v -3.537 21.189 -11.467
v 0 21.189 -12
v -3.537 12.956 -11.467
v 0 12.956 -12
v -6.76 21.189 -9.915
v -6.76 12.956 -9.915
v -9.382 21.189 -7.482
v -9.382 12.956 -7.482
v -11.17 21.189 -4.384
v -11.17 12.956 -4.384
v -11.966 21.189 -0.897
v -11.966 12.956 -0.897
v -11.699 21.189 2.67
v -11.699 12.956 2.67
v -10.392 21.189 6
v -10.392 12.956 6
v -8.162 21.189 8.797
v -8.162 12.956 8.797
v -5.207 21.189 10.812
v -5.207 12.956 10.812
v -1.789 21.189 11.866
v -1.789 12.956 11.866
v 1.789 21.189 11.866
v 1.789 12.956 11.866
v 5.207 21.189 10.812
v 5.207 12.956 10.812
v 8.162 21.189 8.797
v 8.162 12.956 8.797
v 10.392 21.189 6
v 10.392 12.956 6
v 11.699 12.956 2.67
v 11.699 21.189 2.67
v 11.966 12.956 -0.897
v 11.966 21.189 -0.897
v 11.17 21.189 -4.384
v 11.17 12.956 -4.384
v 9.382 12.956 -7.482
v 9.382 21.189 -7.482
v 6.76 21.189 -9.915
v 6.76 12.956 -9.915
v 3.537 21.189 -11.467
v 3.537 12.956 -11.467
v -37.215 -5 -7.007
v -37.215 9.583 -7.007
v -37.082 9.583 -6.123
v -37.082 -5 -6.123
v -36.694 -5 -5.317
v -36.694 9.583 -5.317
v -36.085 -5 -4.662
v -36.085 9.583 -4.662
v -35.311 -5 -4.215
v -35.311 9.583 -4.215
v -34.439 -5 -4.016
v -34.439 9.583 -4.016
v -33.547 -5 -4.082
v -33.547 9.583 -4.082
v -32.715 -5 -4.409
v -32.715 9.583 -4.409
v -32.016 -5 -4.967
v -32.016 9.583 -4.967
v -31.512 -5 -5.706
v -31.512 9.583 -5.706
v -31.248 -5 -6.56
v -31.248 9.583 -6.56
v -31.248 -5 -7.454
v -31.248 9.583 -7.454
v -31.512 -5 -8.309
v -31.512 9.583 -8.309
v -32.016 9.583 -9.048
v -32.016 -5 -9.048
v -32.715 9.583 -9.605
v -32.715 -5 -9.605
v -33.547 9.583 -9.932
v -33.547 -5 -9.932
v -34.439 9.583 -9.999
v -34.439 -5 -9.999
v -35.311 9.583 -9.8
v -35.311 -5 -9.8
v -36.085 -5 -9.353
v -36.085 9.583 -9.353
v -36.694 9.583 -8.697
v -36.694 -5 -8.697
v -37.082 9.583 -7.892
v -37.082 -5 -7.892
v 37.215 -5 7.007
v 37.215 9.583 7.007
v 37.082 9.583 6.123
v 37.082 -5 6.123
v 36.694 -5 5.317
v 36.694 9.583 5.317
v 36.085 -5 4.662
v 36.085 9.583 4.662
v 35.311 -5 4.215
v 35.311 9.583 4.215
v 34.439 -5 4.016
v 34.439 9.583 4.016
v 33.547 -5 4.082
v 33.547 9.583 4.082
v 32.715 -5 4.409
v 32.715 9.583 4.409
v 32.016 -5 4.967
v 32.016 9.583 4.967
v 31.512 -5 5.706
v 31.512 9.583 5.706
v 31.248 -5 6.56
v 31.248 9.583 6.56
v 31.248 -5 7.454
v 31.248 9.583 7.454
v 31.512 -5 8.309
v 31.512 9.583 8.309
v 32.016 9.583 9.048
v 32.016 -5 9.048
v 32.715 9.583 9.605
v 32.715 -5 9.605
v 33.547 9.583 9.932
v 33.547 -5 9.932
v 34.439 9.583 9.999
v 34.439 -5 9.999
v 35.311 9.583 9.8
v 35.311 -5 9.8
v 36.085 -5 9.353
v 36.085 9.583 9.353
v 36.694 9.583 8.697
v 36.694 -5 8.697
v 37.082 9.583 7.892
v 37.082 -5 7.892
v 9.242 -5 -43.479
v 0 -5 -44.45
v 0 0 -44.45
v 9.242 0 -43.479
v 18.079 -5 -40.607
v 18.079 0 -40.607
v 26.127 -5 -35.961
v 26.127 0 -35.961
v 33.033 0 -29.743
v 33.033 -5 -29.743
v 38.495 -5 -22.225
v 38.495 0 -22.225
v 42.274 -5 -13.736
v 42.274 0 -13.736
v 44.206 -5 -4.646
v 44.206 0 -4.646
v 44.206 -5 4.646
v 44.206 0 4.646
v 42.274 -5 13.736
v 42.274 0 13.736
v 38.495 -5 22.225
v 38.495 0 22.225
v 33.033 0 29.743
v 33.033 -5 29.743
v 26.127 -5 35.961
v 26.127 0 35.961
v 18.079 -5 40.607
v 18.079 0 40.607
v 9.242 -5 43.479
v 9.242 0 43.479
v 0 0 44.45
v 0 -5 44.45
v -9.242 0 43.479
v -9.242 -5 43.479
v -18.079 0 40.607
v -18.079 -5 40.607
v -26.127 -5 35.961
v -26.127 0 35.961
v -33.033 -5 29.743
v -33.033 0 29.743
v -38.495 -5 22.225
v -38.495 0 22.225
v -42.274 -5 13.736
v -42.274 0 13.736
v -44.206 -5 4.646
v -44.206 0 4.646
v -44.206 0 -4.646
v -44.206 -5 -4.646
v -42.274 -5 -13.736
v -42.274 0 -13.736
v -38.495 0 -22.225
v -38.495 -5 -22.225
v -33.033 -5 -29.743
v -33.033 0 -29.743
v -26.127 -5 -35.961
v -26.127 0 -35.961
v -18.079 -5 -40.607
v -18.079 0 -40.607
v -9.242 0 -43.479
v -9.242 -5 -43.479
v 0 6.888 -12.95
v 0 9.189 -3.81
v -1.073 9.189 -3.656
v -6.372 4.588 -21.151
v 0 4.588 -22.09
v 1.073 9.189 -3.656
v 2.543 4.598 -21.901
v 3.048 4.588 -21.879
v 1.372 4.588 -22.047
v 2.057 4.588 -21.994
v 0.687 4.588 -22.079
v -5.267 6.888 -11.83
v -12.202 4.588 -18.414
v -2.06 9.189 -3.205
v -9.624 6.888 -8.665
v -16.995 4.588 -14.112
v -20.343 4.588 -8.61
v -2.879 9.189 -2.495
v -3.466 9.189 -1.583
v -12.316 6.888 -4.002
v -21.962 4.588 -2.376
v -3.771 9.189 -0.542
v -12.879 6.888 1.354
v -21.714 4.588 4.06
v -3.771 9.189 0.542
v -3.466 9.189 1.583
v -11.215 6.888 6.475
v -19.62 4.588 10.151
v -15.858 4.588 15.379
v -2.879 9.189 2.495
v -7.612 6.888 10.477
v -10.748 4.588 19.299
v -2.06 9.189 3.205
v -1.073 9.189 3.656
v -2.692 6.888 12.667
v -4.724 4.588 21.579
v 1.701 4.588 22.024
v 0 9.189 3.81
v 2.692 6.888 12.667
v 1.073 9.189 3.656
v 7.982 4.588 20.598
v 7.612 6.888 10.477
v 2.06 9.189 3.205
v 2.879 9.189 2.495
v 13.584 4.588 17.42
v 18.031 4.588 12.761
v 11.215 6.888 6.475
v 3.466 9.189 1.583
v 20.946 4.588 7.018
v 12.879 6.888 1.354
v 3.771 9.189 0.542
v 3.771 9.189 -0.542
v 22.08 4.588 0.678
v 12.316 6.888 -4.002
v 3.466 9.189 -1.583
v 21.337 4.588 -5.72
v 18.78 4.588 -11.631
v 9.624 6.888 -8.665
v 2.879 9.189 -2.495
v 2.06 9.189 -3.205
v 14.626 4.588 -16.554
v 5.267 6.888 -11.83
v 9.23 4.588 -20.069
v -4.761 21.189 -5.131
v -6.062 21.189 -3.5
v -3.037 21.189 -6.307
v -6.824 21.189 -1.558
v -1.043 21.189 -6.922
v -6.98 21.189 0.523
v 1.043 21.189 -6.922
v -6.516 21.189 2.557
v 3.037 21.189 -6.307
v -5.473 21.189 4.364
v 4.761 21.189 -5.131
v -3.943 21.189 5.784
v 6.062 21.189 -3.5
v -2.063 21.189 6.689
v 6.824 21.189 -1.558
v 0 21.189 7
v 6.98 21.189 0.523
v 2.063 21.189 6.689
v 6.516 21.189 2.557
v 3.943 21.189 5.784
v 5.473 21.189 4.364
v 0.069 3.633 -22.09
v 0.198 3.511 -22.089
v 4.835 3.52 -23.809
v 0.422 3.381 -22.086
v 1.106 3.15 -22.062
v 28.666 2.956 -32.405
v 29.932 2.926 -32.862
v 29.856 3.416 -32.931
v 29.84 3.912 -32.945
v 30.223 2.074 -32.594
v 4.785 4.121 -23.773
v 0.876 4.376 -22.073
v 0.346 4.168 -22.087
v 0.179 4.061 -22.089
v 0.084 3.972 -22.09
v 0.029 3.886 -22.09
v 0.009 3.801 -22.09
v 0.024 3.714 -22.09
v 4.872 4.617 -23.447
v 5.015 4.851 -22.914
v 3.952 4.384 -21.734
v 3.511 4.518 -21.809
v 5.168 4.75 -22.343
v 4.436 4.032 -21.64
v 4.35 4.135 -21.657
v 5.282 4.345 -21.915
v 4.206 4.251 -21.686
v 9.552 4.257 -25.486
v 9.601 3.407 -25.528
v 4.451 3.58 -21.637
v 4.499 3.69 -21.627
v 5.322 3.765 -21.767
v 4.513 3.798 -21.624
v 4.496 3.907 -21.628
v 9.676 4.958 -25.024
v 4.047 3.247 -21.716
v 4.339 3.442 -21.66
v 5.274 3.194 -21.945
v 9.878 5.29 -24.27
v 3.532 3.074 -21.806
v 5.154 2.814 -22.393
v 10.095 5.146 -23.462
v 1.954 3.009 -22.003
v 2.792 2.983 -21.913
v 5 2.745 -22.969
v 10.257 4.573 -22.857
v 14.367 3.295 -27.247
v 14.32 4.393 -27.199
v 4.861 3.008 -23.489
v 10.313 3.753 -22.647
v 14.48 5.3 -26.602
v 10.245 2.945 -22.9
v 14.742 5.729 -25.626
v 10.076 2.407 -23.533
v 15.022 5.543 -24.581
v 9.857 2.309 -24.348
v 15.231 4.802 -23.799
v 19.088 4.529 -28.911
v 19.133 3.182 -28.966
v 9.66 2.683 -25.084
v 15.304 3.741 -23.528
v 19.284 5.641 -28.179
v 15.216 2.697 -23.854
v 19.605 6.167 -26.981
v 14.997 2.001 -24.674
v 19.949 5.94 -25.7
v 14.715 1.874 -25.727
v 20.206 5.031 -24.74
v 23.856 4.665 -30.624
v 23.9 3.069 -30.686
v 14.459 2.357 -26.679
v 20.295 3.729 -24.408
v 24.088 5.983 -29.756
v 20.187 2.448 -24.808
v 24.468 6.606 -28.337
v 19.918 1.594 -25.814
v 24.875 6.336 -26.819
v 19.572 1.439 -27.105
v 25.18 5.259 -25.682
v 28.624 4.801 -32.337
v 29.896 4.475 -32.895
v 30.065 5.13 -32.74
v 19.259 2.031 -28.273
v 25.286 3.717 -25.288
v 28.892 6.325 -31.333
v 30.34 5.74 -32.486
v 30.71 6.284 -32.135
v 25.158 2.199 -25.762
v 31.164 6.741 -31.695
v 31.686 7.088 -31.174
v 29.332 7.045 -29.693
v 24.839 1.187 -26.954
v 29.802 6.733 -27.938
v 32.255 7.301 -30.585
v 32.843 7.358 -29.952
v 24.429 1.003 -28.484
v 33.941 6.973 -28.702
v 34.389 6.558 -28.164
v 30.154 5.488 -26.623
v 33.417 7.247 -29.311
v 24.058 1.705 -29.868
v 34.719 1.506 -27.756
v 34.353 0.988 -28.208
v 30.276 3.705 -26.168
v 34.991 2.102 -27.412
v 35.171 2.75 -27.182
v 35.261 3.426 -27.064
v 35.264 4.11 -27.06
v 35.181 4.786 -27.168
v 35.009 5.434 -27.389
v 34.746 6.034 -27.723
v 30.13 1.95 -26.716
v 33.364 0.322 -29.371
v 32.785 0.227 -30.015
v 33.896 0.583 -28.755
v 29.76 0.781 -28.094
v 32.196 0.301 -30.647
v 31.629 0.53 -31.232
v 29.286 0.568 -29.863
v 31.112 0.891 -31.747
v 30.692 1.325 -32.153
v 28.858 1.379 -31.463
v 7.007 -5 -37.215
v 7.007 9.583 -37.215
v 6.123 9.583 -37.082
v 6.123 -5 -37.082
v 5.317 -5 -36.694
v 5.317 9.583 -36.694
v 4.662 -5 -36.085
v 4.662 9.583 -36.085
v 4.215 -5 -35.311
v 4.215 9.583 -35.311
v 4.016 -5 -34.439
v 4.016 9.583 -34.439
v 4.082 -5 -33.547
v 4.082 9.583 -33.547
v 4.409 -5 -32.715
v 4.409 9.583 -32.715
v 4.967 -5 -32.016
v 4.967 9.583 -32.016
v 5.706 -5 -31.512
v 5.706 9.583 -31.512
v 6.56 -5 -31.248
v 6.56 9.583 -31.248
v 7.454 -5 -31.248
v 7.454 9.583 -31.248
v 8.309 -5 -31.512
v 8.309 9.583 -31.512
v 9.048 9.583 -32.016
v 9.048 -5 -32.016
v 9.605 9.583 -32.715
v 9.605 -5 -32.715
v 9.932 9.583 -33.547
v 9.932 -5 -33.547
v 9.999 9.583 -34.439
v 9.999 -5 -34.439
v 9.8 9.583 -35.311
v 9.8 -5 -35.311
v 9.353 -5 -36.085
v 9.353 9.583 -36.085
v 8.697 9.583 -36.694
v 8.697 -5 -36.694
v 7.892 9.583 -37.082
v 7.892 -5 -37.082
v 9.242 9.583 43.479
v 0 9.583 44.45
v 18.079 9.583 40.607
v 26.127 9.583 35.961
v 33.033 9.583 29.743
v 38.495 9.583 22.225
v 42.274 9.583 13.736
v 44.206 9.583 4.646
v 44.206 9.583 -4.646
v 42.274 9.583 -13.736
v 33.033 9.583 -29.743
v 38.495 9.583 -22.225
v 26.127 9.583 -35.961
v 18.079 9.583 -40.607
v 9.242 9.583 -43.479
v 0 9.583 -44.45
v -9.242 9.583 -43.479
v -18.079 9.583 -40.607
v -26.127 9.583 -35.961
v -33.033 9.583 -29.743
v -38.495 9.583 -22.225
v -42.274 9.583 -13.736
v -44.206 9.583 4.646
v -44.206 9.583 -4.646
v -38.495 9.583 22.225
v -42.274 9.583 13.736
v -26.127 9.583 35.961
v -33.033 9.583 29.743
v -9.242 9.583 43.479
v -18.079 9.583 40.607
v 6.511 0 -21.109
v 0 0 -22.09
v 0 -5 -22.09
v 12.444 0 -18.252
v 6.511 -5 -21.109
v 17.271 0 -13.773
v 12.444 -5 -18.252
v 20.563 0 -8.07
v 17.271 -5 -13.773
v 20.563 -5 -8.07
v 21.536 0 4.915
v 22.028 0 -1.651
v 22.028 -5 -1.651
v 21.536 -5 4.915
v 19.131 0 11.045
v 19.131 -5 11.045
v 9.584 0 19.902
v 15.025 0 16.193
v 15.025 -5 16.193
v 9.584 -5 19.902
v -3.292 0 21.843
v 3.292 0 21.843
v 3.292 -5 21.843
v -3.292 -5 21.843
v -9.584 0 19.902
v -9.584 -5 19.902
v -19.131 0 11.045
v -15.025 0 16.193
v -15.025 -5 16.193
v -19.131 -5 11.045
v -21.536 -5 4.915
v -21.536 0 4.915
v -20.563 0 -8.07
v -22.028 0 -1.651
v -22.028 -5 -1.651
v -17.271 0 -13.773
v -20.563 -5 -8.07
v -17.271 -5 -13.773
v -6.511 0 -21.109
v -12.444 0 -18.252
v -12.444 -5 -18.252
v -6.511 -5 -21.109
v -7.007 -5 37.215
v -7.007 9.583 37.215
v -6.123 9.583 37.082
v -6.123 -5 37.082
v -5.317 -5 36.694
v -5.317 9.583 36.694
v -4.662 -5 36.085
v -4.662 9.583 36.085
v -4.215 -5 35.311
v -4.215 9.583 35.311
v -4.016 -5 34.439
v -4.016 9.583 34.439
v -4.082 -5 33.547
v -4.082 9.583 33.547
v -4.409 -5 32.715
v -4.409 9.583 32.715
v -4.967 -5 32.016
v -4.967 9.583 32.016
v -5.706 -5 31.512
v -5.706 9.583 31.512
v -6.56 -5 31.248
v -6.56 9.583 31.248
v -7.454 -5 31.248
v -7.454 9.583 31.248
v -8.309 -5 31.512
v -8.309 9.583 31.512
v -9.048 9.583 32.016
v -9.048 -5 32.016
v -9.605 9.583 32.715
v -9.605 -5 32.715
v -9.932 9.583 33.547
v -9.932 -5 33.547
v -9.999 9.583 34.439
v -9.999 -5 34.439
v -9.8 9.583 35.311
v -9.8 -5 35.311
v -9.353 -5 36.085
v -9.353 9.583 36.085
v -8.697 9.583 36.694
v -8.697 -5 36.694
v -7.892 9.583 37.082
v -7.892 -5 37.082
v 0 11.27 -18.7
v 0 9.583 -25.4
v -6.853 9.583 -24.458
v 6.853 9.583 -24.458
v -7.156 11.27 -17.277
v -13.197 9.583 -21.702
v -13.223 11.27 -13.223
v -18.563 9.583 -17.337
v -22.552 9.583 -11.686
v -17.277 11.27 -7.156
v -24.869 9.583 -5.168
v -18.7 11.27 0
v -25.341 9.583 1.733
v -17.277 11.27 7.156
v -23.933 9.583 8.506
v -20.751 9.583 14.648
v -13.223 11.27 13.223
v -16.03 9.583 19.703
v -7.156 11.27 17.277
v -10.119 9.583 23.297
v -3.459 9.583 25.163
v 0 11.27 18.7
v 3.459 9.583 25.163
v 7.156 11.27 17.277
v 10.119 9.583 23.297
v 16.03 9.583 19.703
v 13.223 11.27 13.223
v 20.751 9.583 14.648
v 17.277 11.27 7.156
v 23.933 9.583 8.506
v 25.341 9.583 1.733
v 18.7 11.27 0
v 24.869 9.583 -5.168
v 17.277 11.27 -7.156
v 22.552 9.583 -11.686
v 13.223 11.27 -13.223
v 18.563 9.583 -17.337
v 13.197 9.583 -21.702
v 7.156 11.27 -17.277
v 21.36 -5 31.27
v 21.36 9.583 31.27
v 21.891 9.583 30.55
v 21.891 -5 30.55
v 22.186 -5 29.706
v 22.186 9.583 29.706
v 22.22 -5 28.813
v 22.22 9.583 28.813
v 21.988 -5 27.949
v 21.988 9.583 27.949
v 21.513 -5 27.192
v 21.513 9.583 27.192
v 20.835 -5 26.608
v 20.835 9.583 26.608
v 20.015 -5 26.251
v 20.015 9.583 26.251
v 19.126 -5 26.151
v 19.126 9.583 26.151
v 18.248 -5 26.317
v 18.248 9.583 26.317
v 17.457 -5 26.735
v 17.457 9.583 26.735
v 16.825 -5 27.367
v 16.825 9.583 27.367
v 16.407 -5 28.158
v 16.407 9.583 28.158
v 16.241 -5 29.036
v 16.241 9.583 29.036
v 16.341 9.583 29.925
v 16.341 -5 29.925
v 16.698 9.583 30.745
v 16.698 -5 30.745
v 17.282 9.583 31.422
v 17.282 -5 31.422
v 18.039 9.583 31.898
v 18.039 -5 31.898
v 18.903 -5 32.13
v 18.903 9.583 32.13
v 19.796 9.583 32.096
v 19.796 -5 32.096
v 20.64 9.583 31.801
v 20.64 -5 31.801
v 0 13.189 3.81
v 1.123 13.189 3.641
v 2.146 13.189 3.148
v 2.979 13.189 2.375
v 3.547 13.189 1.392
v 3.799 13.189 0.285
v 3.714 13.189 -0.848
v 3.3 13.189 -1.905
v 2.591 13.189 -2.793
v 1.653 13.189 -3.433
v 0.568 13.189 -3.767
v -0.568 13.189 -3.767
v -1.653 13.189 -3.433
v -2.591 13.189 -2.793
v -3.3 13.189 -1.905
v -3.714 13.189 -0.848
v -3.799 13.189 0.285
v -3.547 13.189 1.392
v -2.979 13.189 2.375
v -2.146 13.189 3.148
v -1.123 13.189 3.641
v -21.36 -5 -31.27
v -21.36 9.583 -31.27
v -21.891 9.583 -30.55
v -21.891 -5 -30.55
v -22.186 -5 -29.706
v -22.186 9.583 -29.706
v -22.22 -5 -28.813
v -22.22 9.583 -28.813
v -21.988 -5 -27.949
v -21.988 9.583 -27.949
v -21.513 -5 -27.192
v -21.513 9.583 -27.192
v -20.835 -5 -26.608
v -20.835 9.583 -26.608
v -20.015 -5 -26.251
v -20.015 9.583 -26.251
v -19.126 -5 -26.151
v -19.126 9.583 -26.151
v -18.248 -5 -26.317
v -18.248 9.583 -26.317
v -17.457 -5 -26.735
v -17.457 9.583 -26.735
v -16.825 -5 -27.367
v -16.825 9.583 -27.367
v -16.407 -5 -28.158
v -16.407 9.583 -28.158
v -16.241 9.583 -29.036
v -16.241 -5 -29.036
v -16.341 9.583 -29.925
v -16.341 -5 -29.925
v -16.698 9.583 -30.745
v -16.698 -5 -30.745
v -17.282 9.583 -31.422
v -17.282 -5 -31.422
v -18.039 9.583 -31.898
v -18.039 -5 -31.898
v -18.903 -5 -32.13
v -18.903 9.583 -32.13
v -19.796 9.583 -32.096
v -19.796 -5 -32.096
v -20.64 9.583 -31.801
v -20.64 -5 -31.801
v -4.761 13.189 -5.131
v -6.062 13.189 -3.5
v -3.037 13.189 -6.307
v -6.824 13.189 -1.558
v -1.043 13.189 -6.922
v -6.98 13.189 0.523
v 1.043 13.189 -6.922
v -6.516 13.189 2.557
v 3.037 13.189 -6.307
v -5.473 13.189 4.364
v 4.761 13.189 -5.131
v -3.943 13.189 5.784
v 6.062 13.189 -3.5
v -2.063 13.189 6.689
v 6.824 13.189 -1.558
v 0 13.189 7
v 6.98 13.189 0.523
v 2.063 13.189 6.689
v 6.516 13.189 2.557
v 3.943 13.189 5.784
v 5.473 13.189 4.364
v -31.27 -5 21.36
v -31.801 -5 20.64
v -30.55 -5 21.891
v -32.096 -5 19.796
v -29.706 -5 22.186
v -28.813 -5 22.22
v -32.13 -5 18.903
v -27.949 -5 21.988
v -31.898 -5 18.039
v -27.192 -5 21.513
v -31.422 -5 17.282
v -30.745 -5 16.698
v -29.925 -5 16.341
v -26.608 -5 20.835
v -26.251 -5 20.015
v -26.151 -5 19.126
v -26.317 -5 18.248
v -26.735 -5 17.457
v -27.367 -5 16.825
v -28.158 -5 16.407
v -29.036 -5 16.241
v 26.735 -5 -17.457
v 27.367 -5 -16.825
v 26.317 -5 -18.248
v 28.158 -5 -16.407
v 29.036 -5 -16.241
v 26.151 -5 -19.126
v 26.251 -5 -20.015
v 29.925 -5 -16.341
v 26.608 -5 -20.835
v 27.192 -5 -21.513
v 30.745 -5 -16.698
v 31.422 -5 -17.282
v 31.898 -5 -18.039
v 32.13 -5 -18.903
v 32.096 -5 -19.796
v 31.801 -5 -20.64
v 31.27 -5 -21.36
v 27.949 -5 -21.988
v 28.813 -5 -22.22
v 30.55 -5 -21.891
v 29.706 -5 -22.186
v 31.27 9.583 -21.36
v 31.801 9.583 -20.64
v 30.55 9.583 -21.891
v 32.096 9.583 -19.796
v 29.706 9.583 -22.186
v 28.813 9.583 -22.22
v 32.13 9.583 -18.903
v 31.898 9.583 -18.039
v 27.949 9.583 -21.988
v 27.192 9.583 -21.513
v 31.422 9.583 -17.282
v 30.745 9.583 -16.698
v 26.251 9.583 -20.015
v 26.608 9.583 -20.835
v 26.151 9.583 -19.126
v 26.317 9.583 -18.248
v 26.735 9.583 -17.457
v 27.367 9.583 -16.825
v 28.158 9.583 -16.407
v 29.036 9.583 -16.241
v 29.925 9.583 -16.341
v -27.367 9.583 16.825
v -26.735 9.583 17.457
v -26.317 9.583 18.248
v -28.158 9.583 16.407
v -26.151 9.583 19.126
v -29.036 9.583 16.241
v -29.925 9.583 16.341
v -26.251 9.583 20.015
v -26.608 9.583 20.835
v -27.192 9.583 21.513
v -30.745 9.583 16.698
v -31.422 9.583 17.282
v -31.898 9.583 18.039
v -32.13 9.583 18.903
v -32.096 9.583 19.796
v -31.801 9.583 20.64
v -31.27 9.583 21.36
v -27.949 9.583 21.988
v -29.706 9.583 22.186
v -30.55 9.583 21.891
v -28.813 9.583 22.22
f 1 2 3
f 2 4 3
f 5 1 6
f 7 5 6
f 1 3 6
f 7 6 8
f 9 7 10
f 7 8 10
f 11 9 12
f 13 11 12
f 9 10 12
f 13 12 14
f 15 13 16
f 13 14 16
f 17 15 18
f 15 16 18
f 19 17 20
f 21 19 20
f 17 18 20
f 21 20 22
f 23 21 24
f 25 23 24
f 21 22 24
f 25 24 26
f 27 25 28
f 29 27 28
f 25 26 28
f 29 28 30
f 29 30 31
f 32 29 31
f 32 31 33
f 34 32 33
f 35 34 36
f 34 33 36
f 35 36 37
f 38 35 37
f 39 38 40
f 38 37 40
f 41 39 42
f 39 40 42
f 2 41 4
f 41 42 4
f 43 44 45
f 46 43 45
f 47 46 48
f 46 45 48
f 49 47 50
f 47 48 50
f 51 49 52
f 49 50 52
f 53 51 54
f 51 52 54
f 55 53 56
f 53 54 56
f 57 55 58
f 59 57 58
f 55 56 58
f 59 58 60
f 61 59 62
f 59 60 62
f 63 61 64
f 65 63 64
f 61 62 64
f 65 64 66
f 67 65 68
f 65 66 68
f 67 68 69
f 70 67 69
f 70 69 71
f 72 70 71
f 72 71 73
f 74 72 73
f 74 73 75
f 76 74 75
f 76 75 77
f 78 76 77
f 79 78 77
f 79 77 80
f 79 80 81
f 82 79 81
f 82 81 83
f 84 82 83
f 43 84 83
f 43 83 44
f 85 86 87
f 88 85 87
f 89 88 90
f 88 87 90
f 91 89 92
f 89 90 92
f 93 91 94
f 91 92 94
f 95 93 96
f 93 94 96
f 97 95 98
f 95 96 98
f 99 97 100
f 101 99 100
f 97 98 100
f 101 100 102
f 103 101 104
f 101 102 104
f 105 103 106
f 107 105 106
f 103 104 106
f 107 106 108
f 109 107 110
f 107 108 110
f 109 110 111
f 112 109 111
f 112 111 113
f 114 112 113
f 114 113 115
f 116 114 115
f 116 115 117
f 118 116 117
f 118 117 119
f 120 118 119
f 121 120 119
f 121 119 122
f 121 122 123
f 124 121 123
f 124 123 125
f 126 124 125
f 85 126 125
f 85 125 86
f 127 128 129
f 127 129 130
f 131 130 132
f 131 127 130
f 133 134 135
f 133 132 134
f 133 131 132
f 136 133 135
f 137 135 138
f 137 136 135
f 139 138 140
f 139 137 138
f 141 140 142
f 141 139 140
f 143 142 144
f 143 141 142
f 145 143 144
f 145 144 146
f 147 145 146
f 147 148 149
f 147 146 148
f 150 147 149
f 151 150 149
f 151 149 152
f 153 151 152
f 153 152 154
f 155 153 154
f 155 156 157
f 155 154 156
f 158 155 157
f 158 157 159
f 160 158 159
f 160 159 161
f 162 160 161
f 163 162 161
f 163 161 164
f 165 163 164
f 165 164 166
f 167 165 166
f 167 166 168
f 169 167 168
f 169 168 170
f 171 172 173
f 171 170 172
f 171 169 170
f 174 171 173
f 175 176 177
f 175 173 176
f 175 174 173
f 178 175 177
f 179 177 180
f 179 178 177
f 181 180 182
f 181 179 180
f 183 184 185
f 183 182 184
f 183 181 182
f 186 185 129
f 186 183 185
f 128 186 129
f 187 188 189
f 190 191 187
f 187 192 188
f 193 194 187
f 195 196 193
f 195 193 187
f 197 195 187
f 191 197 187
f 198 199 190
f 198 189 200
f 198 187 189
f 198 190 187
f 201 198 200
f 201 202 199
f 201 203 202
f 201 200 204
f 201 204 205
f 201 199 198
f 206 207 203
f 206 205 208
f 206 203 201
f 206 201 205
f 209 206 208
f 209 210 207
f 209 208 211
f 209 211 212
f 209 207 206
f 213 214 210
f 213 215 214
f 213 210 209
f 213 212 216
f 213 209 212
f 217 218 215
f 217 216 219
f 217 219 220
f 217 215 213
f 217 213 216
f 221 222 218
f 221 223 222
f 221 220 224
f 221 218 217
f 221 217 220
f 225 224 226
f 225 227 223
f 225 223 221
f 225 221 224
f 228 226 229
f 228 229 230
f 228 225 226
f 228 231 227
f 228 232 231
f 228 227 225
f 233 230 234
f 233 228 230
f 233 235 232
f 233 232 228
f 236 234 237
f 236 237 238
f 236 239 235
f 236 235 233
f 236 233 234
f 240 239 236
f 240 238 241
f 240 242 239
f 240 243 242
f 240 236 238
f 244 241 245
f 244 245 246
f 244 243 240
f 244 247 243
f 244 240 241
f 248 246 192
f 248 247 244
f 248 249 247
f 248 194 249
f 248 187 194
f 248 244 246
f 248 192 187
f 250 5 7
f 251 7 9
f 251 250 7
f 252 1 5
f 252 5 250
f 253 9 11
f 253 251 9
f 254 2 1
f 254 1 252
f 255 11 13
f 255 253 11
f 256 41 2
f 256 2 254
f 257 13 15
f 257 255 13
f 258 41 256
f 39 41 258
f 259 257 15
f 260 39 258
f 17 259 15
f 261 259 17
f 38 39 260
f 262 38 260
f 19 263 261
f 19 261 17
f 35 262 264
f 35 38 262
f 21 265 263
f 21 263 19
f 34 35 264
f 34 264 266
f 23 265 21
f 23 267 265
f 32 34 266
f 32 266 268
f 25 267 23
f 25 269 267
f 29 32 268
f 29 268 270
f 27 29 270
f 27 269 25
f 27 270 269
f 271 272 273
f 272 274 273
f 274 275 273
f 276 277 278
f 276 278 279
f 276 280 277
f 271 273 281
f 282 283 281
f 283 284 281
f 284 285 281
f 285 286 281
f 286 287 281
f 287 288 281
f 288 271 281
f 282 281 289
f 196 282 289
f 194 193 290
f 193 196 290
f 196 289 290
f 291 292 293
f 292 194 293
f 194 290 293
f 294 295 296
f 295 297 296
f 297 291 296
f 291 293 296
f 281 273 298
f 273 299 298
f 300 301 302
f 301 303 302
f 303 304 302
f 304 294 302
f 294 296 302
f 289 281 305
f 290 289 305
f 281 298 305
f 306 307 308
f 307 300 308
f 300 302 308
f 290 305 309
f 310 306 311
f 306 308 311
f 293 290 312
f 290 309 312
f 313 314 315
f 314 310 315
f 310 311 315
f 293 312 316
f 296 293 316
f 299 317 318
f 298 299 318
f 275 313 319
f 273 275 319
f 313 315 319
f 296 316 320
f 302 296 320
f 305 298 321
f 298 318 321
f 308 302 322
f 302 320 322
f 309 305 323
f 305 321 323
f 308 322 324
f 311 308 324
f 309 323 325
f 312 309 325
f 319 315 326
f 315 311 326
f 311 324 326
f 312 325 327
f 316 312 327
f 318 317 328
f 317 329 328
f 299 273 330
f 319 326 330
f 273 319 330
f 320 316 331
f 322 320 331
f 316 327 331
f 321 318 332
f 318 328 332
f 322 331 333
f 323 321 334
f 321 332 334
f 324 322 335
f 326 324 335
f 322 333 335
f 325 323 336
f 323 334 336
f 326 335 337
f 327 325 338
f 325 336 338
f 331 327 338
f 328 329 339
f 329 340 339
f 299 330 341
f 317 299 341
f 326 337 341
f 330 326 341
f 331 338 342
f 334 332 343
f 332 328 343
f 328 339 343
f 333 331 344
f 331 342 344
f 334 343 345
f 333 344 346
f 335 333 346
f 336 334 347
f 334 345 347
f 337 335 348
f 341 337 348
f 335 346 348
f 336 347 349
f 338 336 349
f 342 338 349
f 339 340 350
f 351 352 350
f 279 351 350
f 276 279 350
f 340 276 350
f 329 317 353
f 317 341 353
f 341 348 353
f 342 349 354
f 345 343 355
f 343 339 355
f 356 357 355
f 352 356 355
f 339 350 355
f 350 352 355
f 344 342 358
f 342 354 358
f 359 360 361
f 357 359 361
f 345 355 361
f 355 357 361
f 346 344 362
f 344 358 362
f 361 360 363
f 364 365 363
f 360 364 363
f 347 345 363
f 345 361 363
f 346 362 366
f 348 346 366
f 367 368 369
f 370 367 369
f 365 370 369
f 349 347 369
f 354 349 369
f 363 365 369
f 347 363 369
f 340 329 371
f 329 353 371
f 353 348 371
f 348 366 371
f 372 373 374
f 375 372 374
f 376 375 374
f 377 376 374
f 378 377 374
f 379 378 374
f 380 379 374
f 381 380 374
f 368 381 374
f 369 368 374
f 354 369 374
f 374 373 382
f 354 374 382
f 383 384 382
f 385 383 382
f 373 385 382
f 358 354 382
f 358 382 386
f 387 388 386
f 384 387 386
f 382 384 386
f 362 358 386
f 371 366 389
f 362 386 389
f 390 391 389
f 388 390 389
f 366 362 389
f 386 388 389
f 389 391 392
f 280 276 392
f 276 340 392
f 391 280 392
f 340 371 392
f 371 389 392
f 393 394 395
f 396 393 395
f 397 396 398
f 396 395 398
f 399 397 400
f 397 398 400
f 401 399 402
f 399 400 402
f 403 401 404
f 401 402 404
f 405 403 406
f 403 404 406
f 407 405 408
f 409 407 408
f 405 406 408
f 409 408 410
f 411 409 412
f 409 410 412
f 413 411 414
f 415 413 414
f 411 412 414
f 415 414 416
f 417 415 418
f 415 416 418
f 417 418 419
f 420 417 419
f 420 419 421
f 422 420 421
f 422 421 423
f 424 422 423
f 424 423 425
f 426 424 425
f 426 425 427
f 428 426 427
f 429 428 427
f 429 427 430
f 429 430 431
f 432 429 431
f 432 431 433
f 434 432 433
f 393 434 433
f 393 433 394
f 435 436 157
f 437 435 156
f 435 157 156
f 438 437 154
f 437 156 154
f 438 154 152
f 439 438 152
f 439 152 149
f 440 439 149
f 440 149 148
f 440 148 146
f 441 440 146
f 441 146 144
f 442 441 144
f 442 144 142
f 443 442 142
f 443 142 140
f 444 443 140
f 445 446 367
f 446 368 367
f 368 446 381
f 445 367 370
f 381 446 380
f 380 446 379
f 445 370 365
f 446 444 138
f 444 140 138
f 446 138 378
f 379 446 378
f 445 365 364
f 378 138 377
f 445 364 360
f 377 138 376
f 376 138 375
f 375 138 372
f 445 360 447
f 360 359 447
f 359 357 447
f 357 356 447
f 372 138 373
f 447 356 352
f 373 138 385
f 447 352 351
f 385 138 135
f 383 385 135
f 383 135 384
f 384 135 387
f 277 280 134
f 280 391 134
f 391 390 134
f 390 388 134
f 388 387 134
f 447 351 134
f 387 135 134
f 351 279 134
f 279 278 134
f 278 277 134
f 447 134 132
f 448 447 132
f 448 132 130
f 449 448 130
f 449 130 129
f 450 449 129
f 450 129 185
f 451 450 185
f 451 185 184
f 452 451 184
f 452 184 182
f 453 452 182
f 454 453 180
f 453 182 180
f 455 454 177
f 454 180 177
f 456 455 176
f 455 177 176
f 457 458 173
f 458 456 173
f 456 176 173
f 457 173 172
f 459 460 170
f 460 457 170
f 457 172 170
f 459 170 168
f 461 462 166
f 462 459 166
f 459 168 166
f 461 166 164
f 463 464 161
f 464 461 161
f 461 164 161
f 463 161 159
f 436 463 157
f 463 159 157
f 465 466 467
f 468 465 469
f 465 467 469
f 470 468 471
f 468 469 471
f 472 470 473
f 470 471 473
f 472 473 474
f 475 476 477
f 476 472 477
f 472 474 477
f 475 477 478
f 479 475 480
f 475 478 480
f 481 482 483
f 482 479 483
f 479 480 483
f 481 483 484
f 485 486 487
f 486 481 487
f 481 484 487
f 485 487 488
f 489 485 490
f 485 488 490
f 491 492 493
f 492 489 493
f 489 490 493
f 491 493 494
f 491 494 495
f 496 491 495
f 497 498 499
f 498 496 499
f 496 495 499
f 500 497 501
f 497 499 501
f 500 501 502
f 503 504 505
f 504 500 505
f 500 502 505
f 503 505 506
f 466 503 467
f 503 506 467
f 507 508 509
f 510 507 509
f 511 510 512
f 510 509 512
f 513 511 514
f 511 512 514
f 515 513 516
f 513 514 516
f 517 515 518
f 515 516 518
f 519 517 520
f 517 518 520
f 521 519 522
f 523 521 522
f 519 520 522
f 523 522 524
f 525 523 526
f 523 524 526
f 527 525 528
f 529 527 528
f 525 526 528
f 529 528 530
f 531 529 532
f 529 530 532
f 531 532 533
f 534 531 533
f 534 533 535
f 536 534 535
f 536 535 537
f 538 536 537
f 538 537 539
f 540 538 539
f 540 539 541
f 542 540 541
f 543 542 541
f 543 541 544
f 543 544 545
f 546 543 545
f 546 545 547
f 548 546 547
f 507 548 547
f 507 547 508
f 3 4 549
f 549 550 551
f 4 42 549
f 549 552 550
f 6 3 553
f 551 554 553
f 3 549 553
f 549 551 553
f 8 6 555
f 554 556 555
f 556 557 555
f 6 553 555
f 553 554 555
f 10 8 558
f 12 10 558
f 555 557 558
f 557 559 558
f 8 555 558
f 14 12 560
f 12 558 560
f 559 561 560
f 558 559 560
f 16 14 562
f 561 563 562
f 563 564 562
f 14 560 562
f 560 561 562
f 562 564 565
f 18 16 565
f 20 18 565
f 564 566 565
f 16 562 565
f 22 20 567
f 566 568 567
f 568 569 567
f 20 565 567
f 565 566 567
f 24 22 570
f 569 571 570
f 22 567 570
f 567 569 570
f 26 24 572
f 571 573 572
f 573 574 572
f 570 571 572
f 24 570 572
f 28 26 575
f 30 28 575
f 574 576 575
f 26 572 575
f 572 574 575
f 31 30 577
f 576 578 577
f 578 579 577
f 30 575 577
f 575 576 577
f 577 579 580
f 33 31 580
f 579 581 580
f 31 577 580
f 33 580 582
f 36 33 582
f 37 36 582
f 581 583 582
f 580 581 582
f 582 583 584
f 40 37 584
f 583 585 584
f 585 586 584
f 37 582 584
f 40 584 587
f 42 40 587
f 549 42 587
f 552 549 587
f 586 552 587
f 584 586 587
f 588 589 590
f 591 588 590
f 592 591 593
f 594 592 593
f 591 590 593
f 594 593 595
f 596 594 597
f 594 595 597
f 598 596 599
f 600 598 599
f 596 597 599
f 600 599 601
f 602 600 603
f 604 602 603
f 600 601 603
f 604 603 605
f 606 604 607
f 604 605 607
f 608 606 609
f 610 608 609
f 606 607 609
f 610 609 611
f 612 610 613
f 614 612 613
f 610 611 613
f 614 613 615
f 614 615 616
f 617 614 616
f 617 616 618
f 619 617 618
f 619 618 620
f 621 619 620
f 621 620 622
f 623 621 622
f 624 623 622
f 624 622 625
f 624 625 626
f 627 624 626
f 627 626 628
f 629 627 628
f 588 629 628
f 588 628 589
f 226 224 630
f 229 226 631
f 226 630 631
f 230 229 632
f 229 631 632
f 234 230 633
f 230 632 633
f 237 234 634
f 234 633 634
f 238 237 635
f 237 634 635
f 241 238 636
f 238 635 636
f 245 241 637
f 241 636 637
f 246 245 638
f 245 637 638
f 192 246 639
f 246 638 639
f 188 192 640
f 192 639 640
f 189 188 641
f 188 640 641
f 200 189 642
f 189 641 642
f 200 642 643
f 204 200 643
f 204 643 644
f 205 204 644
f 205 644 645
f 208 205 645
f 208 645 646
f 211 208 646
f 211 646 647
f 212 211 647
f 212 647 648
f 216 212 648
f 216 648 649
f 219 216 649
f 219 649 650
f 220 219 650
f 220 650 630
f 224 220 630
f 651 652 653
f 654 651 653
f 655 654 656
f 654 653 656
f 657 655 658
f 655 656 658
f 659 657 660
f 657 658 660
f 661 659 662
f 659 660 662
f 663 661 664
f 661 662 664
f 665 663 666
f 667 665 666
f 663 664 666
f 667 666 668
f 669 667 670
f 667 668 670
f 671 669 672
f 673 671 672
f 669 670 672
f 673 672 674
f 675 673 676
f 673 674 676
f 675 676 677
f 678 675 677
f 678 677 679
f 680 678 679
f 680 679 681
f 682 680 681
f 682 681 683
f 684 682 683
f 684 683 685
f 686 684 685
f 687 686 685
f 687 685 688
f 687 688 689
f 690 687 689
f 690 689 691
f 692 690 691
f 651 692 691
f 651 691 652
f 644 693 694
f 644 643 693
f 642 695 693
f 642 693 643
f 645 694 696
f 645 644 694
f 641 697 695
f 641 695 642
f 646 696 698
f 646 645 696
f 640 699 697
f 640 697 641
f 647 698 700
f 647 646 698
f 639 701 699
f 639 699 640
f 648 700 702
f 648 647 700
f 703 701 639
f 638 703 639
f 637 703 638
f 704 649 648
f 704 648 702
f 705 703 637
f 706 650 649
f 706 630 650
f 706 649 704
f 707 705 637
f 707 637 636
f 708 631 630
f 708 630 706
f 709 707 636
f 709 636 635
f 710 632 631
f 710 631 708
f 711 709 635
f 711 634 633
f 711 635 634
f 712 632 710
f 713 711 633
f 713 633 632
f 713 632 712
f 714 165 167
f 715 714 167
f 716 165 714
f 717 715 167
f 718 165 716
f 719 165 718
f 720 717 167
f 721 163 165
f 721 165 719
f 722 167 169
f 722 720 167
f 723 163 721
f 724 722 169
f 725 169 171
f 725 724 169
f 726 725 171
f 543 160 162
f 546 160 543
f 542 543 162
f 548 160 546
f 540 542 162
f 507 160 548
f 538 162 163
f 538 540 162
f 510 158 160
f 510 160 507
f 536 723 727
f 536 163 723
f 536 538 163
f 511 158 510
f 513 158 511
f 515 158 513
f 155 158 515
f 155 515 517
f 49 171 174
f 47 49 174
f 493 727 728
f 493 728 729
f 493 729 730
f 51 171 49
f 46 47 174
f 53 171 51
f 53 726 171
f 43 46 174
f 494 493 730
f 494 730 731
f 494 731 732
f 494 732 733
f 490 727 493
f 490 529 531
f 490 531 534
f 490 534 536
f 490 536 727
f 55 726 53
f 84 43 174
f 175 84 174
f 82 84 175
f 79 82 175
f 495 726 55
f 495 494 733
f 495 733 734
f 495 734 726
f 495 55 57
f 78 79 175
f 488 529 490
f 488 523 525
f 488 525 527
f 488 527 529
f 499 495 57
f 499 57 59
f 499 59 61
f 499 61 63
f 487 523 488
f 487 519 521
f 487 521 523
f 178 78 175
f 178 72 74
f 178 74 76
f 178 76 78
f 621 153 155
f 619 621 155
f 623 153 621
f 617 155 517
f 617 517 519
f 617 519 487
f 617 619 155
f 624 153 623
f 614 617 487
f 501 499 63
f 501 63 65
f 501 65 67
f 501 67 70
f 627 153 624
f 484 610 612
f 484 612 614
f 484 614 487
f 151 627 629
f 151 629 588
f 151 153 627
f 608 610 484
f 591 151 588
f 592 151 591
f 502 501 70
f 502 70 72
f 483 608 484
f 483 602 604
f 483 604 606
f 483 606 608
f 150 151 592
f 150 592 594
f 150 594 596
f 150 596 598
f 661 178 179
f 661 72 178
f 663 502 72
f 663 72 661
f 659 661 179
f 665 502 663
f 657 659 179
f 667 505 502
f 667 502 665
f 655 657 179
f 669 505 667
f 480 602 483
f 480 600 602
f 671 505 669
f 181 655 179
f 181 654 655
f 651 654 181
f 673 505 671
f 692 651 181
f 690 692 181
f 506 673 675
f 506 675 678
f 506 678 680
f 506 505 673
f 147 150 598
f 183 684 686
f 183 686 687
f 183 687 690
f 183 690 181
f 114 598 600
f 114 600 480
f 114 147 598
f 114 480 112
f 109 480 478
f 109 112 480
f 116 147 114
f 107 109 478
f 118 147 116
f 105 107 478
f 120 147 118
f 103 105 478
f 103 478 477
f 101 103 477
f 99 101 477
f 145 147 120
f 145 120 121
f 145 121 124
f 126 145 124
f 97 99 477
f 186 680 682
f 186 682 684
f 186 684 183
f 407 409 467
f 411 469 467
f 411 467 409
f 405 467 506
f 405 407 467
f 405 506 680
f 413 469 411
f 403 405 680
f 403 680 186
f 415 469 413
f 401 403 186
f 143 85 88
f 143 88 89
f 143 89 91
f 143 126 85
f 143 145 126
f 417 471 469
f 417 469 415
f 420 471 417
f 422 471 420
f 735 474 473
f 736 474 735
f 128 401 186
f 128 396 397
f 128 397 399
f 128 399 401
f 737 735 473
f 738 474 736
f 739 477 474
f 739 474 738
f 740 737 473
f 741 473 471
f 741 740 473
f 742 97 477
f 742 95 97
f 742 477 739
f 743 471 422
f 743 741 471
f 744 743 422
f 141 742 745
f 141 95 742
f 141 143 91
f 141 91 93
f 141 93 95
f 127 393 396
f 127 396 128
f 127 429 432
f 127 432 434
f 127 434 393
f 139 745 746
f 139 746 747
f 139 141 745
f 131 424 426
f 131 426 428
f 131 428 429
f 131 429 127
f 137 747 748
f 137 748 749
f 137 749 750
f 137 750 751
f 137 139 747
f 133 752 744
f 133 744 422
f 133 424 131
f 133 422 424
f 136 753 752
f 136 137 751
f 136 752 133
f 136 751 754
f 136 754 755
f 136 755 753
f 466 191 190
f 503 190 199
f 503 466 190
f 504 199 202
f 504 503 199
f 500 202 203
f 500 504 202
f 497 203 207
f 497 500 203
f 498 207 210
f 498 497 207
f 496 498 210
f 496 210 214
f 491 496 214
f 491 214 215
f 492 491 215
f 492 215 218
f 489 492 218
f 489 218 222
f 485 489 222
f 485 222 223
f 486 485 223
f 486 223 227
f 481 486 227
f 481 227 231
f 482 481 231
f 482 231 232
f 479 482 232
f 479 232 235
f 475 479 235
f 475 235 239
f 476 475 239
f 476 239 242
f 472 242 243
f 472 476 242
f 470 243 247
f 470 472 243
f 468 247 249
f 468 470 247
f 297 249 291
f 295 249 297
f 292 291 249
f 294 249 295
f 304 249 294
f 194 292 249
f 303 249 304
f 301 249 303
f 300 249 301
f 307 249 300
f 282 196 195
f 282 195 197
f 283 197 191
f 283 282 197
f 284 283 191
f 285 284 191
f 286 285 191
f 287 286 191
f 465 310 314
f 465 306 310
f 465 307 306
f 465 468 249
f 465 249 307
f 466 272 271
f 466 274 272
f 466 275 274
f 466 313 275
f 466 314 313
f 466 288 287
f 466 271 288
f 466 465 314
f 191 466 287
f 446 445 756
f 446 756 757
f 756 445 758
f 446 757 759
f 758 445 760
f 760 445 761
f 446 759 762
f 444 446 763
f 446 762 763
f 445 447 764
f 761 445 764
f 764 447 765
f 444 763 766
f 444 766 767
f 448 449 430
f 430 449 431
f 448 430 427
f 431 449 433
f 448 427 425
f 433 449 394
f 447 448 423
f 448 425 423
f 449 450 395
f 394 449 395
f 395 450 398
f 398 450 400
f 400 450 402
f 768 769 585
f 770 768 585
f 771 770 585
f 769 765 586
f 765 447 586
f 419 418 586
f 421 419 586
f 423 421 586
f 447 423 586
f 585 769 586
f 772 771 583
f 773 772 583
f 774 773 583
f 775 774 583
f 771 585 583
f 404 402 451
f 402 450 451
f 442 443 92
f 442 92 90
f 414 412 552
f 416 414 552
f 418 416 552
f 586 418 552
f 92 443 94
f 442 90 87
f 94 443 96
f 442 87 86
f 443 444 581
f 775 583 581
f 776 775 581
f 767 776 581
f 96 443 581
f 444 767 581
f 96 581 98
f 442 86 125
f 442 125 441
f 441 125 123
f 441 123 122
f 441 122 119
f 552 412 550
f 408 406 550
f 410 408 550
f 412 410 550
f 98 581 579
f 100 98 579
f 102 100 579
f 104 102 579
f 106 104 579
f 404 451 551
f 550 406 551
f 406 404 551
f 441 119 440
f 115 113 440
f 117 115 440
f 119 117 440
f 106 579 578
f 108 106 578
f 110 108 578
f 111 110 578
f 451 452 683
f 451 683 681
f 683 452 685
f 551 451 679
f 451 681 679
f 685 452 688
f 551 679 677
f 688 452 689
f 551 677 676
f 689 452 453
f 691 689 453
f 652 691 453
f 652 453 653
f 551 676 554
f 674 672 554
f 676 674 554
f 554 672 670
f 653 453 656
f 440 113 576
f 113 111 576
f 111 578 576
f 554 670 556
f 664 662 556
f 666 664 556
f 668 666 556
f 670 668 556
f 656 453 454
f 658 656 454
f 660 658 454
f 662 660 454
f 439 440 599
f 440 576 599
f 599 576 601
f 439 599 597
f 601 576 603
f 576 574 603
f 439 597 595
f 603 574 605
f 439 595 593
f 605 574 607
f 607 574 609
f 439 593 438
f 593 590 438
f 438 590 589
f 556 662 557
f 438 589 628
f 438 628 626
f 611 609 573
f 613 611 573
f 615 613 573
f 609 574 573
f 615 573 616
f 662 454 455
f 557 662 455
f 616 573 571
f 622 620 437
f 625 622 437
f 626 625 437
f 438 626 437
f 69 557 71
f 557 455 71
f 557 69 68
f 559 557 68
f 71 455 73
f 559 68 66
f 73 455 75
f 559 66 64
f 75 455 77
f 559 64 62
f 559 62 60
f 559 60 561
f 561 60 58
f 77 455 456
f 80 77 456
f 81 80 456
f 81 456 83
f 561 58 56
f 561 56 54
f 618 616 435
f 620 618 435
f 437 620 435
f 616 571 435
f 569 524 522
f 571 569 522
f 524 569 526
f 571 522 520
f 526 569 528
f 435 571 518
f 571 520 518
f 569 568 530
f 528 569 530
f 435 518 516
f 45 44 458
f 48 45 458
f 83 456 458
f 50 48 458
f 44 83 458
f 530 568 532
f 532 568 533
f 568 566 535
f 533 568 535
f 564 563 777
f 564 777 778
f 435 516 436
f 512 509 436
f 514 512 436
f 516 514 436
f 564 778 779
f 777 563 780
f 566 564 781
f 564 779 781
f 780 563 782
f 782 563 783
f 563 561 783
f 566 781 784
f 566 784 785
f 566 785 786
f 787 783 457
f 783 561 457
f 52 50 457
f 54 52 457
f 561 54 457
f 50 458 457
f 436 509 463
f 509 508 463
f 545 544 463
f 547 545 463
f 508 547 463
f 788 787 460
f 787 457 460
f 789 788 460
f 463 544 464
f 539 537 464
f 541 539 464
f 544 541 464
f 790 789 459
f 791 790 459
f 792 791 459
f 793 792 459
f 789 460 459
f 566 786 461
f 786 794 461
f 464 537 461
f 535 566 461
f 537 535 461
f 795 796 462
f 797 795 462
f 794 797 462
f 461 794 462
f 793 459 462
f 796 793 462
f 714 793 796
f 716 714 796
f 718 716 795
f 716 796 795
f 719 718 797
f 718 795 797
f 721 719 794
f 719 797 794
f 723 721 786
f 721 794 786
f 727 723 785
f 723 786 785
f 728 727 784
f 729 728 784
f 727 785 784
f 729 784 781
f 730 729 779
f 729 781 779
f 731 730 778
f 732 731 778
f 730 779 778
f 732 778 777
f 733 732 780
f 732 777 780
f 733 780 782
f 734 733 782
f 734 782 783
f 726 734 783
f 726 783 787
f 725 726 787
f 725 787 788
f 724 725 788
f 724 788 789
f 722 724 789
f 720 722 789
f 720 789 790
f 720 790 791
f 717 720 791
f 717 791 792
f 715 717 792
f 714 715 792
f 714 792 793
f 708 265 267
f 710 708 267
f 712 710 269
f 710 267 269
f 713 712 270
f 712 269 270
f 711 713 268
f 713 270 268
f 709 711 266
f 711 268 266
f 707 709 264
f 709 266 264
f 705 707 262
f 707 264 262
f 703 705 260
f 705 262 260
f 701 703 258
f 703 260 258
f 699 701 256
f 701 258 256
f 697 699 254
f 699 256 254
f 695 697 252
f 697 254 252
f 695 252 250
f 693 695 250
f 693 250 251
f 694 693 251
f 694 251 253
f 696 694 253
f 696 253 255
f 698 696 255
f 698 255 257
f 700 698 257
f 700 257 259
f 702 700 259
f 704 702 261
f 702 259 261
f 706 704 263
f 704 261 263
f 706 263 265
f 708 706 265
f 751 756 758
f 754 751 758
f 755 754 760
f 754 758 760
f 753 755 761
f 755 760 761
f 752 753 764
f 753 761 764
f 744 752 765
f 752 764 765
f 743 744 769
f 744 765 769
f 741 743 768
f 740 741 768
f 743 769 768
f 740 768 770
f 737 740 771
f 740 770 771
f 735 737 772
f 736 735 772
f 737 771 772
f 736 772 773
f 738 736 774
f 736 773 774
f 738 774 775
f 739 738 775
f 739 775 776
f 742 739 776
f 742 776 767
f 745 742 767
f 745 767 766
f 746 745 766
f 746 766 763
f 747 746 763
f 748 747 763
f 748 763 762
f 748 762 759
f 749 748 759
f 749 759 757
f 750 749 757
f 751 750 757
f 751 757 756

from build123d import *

# Parameters (mm, degrees)
SKETCH1_R            = 44.45
BODY_EXTRUSION_DEPTH = 21.189302622
SKETCH6_R            = 3.81
DE_DEPTH             = 100
SKETCH7_R            = 7
INLET_TAP_DEPTH      = 8
BASE_START           = 5
SKETCH26_R           = 44.45
SKETCH26_R_2         = 22.09
BASE_RISER_DEPTH     = 5
SKETCH13_R           = 3
BOLT_HOLES_DEPTH     = 100
BOLT_PATTERN_COUNT   = 8


with BuildPart() as part:
    # Sketch1 → body extrusion (new body)
    with BuildSketch(Plane(origin=(0, 0, 0), x_dir=(1, 0, 0), z_dir=(0, 1, 0))):
        with Locations(Location((0, 0, 0), (0, 0, 270))):
            Circle(SKETCH1_R)
    extrude(amount=BODY_EXTRUSION_DEPTH)

    # Sketch2 → main chamber (revolve, cut)
    with BuildSketch(Plane.XY, mode=Mode.PRIVATE) as main_chamber_sk:
        Polygon((0, 0), (0, 9.189302622), (3.81, 9.189302622), (22.09, 4.5875), (22.09, 0), align=None)
    revolve(main_chamber_sk.sketch.rotate(Axis((0, 0, 0), (0, 1, 0)), 90), axis=Axis((0, 0, 0), (0, 1, 0)), mode=Mode.SUBTRACT)

    # Sketch6 → De (cut)
    with BuildSketch(Plane(origin=(0, 21.189302622, 0), x_dir=(1, 0, 0), z_dir=(0, 1, 0))):
        with Locations(Location((0, 0, 0), (0, 0, 270))):
            Circle(SKETCH6_R)
    extrude(amount=-DE_DEPTH, mode=Mode.SUBTRACT)

    # Sketch7 → inlet tap (cut)
    with BuildSketch(Plane(origin=(0, 21.189302622, 0), x_dir=(1, 0, 0), z_dir=(0, 1, 0))):
        with Locations(Location((0, 0, 0), (0, 0, 270))):
            Circle(SKETCH7_R)
    extrude(amount=-INLET_TAP_DEPTH, mode=Mode.SUBTRACT)

    # Sketch11 → conical outlet (revolve, cut)
    with BuildSketch(Plane(origin=(-5.360707244, 0, -20.006431798), x_dir=(0.9659258262890693, 0, -0.2588190451025173), z_dir=(0.2588190451025173, 0, 0.9659258262890693)), mode=Mode.PRIVATE) as conical_outlet_sk:
        Polygon((5.54981252, 4.401182844), (105.169282329, 13.116757119), (105.169282329, 3.79375), (5.54981252, 3.79375), align=None)
    revolve(conical_outlet_sk.sketch.rotate(Axis((0, 3.79375, -21.442828975), (0.9659258262890692, 0, -0.2588190451025173)), 255.191029346), axis=Axis((0, 3.79375, -21.442828975), (0.9659258262890692, 0, -0.2588190451025173)), mode=Mode.SUBTRACT)

    # Sketch16 → outer profile (revolve, cut)
    with BuildSketch(Plane.XY, mode=Mode.PRIVATE) as outer_profile_sk:
        Polygon((12, 21.189302622), (12, 12.956212983), (25.4, 9.582900339), (44.45, 9.582900339), (44.45, 21.189302622), align=None)
    revolve(outer_profile_sk.sketch.rotate(Axis((0, 0, 0), (0, 1, 0)), 90), axis=Axis((0, 0, 0), (0, 1, 0)), mode=Mode.SUBTRACT)

    # Sketch26 → base riser (add)
    with BuildSketch(Plane.XZ.offset(BASE_START)):
        with Locations(Location((0, 0, 0), (0, 0, 270))):
            Circle(SKETCH26_R)
        with Locations(Location((0, 0, 0), (0, 0, 270))):
            Circle(SKETCH26_R_2, mode=Mode.SUBTRACT)
    extrude(amount=-BASE_RISER_DEPTH)

    # Sketch13 → bolt holes (cut)
    with BuildSketch(Plane(origin=(0, 21.189302622, 0), x_dir=(1, 0, 0), z_dir=(0, 1, 0))):
        with Locations(Location((7.007261141, 34.214820127, 0), (0, 0, 90))):
            Circle(SKETCH13_R)
    bolt_holes = extrude(amount=-BOLT_HOLES_DEPTH, mode=Mode.SUBTRACT)

    # bolt pattern: bolt holes ×8 about axis
    bolt_pattern_axis = Axis((0, 0, 0), (0, 1, 0))
    for i in range(1, BOLT_PATTERN_COUNT):
        add(bolt_holes.rotate(bolt_pattern_axis, i * 360 / BOLT_PATTERN_COUNT), mode=Mode.SUBTRACT)


solid = part.part
